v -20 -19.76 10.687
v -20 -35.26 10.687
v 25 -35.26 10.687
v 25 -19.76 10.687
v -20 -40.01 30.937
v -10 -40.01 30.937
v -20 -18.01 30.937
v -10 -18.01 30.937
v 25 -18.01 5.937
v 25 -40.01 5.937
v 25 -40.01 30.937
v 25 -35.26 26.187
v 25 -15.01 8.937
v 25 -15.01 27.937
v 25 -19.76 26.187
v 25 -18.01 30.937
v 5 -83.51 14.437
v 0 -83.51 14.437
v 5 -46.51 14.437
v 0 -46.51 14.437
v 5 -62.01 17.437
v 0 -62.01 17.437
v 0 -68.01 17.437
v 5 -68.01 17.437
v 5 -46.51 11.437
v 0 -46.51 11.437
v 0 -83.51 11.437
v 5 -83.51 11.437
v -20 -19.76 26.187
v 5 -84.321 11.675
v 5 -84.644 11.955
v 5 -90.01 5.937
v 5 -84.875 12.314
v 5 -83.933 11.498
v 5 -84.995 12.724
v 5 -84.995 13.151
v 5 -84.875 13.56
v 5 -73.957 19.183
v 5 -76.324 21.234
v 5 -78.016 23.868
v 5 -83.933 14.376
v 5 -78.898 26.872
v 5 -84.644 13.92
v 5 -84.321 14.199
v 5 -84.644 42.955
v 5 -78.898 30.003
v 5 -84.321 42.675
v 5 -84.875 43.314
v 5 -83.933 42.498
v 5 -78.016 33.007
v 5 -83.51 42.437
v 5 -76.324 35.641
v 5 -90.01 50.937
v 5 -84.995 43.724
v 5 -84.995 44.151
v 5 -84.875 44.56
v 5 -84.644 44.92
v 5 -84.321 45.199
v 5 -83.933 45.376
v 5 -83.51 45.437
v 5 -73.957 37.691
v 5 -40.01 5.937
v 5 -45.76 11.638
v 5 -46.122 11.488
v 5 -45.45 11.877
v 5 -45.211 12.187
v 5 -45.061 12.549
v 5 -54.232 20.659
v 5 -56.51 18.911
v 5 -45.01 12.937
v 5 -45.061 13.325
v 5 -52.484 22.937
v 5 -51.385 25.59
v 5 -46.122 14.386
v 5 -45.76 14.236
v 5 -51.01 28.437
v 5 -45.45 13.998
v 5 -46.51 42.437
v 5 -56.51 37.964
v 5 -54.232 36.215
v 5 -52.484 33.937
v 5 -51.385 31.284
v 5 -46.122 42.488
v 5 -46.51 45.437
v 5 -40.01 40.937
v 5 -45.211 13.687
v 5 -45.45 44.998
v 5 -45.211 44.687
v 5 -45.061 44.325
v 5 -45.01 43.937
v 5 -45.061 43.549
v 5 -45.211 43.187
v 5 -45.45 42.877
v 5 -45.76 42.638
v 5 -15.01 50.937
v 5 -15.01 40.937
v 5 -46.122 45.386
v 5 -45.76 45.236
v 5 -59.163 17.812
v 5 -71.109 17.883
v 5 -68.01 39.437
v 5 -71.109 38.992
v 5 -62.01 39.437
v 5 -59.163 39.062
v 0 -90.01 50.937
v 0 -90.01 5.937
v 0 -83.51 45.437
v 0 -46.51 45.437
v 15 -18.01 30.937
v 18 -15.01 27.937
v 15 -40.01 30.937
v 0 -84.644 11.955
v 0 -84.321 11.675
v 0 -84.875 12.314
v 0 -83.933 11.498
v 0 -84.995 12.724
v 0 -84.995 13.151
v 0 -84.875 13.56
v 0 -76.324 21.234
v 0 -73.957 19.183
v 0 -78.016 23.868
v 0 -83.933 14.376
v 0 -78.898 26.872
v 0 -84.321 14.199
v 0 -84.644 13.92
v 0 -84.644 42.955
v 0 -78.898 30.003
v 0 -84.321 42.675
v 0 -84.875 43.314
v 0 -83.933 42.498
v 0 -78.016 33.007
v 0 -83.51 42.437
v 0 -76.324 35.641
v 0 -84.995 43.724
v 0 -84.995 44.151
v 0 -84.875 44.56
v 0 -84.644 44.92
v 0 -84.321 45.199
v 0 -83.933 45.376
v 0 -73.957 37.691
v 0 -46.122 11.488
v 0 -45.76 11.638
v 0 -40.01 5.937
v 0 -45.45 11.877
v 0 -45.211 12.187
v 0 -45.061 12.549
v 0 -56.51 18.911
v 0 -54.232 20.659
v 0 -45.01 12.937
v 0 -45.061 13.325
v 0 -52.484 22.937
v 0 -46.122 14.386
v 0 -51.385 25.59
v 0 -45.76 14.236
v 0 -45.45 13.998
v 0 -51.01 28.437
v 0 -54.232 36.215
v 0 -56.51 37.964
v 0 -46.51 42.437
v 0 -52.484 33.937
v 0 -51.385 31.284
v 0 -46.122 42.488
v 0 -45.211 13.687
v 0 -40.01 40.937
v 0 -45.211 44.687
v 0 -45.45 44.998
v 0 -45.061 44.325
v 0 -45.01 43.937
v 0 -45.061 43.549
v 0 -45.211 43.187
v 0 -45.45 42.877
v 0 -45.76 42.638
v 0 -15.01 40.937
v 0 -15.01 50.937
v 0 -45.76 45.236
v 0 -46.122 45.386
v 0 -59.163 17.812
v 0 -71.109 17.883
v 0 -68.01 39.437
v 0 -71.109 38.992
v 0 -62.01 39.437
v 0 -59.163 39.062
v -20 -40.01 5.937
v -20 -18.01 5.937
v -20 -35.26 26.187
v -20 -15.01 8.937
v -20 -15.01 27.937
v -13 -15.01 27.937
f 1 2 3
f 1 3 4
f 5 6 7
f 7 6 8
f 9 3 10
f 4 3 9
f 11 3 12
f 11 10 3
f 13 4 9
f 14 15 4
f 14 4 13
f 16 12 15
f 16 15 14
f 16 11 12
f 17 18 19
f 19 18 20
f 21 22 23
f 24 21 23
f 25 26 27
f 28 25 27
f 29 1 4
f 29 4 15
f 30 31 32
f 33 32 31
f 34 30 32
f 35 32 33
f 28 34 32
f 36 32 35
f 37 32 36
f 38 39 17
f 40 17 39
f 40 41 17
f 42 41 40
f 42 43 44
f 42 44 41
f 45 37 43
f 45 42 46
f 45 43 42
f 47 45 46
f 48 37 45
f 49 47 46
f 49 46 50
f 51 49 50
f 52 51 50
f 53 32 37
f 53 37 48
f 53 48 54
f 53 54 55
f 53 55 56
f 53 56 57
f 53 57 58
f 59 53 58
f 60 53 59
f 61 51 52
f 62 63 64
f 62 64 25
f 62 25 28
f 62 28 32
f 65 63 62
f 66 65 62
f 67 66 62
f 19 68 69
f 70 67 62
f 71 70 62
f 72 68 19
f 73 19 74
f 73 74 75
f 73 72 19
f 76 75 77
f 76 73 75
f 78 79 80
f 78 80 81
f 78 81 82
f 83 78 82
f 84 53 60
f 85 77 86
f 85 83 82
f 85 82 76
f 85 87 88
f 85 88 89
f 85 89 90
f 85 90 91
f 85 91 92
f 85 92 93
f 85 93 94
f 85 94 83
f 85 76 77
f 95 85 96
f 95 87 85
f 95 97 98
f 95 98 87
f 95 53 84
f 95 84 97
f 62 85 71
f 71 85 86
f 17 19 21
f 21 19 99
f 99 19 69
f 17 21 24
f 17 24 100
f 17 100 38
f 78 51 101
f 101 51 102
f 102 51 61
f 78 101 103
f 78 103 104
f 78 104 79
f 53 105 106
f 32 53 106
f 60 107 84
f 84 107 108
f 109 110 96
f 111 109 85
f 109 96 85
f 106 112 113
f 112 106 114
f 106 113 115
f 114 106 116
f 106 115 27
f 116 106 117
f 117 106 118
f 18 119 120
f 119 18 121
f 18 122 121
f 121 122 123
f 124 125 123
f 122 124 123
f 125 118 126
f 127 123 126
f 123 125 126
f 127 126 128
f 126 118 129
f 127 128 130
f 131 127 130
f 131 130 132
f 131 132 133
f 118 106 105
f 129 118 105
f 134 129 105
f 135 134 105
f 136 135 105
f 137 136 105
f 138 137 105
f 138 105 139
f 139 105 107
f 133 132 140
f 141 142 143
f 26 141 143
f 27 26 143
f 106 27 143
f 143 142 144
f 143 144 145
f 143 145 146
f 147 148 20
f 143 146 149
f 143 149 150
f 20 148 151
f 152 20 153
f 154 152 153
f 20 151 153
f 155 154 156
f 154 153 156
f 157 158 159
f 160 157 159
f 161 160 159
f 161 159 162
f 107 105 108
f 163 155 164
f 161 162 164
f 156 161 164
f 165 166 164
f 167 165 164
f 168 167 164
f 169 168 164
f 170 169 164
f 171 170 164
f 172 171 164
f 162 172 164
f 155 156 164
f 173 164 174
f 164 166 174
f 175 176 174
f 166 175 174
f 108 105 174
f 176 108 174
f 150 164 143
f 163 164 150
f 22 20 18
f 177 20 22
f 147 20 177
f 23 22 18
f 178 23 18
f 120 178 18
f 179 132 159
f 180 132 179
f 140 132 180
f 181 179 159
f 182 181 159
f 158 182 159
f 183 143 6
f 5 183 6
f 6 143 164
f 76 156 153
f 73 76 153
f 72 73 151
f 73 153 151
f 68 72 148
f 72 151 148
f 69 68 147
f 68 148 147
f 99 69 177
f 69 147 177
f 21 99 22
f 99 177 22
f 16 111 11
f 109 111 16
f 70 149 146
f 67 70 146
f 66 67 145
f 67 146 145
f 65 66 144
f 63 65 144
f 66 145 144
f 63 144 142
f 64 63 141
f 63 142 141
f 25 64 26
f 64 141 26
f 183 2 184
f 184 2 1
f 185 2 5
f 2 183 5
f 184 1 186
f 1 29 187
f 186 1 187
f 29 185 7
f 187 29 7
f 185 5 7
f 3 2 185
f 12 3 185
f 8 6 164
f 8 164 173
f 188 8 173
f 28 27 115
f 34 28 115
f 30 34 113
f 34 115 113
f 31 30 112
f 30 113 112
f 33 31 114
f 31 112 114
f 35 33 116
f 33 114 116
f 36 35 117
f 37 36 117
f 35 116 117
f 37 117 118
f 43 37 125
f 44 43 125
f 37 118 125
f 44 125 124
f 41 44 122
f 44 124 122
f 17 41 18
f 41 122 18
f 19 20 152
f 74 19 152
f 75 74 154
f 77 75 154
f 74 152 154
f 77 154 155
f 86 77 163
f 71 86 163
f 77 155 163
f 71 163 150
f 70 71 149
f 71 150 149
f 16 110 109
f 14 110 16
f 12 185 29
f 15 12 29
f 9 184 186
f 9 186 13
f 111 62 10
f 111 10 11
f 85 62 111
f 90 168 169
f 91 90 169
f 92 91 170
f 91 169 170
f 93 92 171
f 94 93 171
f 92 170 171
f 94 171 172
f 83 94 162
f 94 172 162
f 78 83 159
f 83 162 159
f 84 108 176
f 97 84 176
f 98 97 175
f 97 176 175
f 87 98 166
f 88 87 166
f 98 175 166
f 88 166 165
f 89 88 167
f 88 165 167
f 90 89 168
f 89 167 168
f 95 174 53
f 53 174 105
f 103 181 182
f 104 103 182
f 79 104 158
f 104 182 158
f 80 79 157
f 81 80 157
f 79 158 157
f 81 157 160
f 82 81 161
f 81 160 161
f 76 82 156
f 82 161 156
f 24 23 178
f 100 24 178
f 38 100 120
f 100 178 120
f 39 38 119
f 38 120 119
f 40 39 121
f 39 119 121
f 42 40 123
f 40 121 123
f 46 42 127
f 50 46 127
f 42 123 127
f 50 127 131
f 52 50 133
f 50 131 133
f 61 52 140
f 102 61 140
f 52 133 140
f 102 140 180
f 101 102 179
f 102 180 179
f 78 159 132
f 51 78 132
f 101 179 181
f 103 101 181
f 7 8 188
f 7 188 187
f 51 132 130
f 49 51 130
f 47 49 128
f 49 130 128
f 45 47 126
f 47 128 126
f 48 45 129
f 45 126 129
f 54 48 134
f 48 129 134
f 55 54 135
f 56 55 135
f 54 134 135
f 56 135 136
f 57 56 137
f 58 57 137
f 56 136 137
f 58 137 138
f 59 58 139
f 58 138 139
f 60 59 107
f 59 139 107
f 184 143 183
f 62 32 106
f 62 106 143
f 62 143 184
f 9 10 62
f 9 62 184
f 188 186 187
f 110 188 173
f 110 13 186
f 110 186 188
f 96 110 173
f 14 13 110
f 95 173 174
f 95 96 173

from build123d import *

# Parameters (mm, degrees)
F0_W          = 25
F0_H          = 25
F0_W_2        = 15.5
F0_H_2        = 15.5
F1_DEPTH      = 5
F2_DEPTH      = 25
F2_DEPTH_BACK = 20
F3_SIZE       = 10
F4_SIZE       = 3


with BuildPart() as f1:
    # F0 (on Right) → F1 (new body)
    with BuildSketch(Plane.YZ):
        Polygon((-40.0103315711, 5.9372586757), (-40.0103315711, 30.9372586757), (-15.0103315711, 30.9372586757), (-15.0103315711, 50.9372586757), (-40.0103315711, 50.9372586757), (-90.0103315711, 50.9372586757), (-90.0103315711, 5.9372586757), align=None)
        with BuildLine():
            ThreePointArc((-46.5103315711, 14.4372586757), (-45.4496713993, 13.9979188475), (-45.0103315711, 12.9372586757))
            ThreePointArc((-45.0103315711, 12.9372586757), (-45.4496713993, 11.8765985039), (-46.5103315711, 11.4372586757))
            Line((-46.5103315711, 11.4372586757), (-83.5103315711, 11.4372586757))
            ThreePointArc((-83.5103315711, 11.4372586757), (-85.0103315711, 12.9372586757), (-83.5103315711, 14.4372586757))
            Line((-83.5103315711, 14.4372586757), (-46.5103315711, 14.4372586757))
        make_face(mode=Mode.SUBTRACT)
        with BuildLine():
            ThreePointArc((-62.0103315711, 39.4372586757), (-54.2321569781, 36.2154332687), (-51.0103315711, 28.4372586757))
            ThreePointArc((-51.0103315711, 28.4372586757), (-54.2321569781, 20.6590840826), (-62.0103315711, 17.4372586757))
            Line((-62.0103315711, 17.4372586757), (-68.0103315711, 17.4372586757))
            ThreePointArc((-68.0103315711, 17.4372586757), (-79.0103315711, 28.4372586757), (-68.0103315711, 39.4372586757))
            Line((-68.0103315711, 39.4372586757), (-62.0103315711, 39.4372586757))
        make_face(mode=Mode.SUBTRACT)
        with BuildLine():
            ThreePointArc((-83.5103315711, 42.4372586757), (-85.0103315711, 43.9372586757), (-83.5103315711, 45.4372586757))
            Line((-83.5103315711, 45.4372586757), (-46.5103315711, 45.4372586757))
            ThreePointArc((-46.5103315711, 45.4372586757), (-45.4496713993, 44.9979188475), (-45.0103315711, 43.9372586757))
            ThreePointArc((-45.0103315711, 43.9372586757), (-45.4496713993, 42.8765985039), (-46.5103315711, 42.4372586757))
            Line((-46.5103315711, 42.4372586757), (-83.5103315711, 42.4372586757))
        make_face(mode=Mode.SUBTRACT)
        with Locations((-27.5103315711, 18.4372586757)):
            Rectangle(F0_W, F0_H)
        with Locations((-27.5103315711, 18.4372586757)):
            Rectangle(F0_W_2, F0_H_2, mode=Mode.SUBTRACT)
    extrude(amount=F1_DEPTH)

    # F0 (on Right) → F2 (join, two sides)
    with BuildSketch(Plane.YZ) as f2_sk:
        with Locations((-27.5103315711, 18.4372586757)):
            Rectangle(F0_W, F0_H)
        with Locations((-27.5103315711, 18.4372586757)):
            Rectangle(F0_W_2, F0_H_2, mode=Mode.SUBTRACT)
    extrude(amount=F2_DEPTH)
    extrude(f2_sk.sketch, amount=-F2_DEPTH_BACK)

    # F3
    f3_edges = [f1.edges().sort_by_distance(p)[0] for p in [
        (5, -27.510332, 30.937259),
        (0, -27.510332, 30.937259),
    ]]
    chamfer(f3_edges, length=F3_SIZE)

    # F4
    f4_edges = [f1.edges().sort_by_distance(p)[0] for p in [
        (2.5, -15.010332, 5.937259),
        (-15, -15.010332, 30.937259),
        (20, -15.010332, 30.937259),
    ]]
    chamfer(f4_edges, length=F4_SIZE)


solid = f1.part
